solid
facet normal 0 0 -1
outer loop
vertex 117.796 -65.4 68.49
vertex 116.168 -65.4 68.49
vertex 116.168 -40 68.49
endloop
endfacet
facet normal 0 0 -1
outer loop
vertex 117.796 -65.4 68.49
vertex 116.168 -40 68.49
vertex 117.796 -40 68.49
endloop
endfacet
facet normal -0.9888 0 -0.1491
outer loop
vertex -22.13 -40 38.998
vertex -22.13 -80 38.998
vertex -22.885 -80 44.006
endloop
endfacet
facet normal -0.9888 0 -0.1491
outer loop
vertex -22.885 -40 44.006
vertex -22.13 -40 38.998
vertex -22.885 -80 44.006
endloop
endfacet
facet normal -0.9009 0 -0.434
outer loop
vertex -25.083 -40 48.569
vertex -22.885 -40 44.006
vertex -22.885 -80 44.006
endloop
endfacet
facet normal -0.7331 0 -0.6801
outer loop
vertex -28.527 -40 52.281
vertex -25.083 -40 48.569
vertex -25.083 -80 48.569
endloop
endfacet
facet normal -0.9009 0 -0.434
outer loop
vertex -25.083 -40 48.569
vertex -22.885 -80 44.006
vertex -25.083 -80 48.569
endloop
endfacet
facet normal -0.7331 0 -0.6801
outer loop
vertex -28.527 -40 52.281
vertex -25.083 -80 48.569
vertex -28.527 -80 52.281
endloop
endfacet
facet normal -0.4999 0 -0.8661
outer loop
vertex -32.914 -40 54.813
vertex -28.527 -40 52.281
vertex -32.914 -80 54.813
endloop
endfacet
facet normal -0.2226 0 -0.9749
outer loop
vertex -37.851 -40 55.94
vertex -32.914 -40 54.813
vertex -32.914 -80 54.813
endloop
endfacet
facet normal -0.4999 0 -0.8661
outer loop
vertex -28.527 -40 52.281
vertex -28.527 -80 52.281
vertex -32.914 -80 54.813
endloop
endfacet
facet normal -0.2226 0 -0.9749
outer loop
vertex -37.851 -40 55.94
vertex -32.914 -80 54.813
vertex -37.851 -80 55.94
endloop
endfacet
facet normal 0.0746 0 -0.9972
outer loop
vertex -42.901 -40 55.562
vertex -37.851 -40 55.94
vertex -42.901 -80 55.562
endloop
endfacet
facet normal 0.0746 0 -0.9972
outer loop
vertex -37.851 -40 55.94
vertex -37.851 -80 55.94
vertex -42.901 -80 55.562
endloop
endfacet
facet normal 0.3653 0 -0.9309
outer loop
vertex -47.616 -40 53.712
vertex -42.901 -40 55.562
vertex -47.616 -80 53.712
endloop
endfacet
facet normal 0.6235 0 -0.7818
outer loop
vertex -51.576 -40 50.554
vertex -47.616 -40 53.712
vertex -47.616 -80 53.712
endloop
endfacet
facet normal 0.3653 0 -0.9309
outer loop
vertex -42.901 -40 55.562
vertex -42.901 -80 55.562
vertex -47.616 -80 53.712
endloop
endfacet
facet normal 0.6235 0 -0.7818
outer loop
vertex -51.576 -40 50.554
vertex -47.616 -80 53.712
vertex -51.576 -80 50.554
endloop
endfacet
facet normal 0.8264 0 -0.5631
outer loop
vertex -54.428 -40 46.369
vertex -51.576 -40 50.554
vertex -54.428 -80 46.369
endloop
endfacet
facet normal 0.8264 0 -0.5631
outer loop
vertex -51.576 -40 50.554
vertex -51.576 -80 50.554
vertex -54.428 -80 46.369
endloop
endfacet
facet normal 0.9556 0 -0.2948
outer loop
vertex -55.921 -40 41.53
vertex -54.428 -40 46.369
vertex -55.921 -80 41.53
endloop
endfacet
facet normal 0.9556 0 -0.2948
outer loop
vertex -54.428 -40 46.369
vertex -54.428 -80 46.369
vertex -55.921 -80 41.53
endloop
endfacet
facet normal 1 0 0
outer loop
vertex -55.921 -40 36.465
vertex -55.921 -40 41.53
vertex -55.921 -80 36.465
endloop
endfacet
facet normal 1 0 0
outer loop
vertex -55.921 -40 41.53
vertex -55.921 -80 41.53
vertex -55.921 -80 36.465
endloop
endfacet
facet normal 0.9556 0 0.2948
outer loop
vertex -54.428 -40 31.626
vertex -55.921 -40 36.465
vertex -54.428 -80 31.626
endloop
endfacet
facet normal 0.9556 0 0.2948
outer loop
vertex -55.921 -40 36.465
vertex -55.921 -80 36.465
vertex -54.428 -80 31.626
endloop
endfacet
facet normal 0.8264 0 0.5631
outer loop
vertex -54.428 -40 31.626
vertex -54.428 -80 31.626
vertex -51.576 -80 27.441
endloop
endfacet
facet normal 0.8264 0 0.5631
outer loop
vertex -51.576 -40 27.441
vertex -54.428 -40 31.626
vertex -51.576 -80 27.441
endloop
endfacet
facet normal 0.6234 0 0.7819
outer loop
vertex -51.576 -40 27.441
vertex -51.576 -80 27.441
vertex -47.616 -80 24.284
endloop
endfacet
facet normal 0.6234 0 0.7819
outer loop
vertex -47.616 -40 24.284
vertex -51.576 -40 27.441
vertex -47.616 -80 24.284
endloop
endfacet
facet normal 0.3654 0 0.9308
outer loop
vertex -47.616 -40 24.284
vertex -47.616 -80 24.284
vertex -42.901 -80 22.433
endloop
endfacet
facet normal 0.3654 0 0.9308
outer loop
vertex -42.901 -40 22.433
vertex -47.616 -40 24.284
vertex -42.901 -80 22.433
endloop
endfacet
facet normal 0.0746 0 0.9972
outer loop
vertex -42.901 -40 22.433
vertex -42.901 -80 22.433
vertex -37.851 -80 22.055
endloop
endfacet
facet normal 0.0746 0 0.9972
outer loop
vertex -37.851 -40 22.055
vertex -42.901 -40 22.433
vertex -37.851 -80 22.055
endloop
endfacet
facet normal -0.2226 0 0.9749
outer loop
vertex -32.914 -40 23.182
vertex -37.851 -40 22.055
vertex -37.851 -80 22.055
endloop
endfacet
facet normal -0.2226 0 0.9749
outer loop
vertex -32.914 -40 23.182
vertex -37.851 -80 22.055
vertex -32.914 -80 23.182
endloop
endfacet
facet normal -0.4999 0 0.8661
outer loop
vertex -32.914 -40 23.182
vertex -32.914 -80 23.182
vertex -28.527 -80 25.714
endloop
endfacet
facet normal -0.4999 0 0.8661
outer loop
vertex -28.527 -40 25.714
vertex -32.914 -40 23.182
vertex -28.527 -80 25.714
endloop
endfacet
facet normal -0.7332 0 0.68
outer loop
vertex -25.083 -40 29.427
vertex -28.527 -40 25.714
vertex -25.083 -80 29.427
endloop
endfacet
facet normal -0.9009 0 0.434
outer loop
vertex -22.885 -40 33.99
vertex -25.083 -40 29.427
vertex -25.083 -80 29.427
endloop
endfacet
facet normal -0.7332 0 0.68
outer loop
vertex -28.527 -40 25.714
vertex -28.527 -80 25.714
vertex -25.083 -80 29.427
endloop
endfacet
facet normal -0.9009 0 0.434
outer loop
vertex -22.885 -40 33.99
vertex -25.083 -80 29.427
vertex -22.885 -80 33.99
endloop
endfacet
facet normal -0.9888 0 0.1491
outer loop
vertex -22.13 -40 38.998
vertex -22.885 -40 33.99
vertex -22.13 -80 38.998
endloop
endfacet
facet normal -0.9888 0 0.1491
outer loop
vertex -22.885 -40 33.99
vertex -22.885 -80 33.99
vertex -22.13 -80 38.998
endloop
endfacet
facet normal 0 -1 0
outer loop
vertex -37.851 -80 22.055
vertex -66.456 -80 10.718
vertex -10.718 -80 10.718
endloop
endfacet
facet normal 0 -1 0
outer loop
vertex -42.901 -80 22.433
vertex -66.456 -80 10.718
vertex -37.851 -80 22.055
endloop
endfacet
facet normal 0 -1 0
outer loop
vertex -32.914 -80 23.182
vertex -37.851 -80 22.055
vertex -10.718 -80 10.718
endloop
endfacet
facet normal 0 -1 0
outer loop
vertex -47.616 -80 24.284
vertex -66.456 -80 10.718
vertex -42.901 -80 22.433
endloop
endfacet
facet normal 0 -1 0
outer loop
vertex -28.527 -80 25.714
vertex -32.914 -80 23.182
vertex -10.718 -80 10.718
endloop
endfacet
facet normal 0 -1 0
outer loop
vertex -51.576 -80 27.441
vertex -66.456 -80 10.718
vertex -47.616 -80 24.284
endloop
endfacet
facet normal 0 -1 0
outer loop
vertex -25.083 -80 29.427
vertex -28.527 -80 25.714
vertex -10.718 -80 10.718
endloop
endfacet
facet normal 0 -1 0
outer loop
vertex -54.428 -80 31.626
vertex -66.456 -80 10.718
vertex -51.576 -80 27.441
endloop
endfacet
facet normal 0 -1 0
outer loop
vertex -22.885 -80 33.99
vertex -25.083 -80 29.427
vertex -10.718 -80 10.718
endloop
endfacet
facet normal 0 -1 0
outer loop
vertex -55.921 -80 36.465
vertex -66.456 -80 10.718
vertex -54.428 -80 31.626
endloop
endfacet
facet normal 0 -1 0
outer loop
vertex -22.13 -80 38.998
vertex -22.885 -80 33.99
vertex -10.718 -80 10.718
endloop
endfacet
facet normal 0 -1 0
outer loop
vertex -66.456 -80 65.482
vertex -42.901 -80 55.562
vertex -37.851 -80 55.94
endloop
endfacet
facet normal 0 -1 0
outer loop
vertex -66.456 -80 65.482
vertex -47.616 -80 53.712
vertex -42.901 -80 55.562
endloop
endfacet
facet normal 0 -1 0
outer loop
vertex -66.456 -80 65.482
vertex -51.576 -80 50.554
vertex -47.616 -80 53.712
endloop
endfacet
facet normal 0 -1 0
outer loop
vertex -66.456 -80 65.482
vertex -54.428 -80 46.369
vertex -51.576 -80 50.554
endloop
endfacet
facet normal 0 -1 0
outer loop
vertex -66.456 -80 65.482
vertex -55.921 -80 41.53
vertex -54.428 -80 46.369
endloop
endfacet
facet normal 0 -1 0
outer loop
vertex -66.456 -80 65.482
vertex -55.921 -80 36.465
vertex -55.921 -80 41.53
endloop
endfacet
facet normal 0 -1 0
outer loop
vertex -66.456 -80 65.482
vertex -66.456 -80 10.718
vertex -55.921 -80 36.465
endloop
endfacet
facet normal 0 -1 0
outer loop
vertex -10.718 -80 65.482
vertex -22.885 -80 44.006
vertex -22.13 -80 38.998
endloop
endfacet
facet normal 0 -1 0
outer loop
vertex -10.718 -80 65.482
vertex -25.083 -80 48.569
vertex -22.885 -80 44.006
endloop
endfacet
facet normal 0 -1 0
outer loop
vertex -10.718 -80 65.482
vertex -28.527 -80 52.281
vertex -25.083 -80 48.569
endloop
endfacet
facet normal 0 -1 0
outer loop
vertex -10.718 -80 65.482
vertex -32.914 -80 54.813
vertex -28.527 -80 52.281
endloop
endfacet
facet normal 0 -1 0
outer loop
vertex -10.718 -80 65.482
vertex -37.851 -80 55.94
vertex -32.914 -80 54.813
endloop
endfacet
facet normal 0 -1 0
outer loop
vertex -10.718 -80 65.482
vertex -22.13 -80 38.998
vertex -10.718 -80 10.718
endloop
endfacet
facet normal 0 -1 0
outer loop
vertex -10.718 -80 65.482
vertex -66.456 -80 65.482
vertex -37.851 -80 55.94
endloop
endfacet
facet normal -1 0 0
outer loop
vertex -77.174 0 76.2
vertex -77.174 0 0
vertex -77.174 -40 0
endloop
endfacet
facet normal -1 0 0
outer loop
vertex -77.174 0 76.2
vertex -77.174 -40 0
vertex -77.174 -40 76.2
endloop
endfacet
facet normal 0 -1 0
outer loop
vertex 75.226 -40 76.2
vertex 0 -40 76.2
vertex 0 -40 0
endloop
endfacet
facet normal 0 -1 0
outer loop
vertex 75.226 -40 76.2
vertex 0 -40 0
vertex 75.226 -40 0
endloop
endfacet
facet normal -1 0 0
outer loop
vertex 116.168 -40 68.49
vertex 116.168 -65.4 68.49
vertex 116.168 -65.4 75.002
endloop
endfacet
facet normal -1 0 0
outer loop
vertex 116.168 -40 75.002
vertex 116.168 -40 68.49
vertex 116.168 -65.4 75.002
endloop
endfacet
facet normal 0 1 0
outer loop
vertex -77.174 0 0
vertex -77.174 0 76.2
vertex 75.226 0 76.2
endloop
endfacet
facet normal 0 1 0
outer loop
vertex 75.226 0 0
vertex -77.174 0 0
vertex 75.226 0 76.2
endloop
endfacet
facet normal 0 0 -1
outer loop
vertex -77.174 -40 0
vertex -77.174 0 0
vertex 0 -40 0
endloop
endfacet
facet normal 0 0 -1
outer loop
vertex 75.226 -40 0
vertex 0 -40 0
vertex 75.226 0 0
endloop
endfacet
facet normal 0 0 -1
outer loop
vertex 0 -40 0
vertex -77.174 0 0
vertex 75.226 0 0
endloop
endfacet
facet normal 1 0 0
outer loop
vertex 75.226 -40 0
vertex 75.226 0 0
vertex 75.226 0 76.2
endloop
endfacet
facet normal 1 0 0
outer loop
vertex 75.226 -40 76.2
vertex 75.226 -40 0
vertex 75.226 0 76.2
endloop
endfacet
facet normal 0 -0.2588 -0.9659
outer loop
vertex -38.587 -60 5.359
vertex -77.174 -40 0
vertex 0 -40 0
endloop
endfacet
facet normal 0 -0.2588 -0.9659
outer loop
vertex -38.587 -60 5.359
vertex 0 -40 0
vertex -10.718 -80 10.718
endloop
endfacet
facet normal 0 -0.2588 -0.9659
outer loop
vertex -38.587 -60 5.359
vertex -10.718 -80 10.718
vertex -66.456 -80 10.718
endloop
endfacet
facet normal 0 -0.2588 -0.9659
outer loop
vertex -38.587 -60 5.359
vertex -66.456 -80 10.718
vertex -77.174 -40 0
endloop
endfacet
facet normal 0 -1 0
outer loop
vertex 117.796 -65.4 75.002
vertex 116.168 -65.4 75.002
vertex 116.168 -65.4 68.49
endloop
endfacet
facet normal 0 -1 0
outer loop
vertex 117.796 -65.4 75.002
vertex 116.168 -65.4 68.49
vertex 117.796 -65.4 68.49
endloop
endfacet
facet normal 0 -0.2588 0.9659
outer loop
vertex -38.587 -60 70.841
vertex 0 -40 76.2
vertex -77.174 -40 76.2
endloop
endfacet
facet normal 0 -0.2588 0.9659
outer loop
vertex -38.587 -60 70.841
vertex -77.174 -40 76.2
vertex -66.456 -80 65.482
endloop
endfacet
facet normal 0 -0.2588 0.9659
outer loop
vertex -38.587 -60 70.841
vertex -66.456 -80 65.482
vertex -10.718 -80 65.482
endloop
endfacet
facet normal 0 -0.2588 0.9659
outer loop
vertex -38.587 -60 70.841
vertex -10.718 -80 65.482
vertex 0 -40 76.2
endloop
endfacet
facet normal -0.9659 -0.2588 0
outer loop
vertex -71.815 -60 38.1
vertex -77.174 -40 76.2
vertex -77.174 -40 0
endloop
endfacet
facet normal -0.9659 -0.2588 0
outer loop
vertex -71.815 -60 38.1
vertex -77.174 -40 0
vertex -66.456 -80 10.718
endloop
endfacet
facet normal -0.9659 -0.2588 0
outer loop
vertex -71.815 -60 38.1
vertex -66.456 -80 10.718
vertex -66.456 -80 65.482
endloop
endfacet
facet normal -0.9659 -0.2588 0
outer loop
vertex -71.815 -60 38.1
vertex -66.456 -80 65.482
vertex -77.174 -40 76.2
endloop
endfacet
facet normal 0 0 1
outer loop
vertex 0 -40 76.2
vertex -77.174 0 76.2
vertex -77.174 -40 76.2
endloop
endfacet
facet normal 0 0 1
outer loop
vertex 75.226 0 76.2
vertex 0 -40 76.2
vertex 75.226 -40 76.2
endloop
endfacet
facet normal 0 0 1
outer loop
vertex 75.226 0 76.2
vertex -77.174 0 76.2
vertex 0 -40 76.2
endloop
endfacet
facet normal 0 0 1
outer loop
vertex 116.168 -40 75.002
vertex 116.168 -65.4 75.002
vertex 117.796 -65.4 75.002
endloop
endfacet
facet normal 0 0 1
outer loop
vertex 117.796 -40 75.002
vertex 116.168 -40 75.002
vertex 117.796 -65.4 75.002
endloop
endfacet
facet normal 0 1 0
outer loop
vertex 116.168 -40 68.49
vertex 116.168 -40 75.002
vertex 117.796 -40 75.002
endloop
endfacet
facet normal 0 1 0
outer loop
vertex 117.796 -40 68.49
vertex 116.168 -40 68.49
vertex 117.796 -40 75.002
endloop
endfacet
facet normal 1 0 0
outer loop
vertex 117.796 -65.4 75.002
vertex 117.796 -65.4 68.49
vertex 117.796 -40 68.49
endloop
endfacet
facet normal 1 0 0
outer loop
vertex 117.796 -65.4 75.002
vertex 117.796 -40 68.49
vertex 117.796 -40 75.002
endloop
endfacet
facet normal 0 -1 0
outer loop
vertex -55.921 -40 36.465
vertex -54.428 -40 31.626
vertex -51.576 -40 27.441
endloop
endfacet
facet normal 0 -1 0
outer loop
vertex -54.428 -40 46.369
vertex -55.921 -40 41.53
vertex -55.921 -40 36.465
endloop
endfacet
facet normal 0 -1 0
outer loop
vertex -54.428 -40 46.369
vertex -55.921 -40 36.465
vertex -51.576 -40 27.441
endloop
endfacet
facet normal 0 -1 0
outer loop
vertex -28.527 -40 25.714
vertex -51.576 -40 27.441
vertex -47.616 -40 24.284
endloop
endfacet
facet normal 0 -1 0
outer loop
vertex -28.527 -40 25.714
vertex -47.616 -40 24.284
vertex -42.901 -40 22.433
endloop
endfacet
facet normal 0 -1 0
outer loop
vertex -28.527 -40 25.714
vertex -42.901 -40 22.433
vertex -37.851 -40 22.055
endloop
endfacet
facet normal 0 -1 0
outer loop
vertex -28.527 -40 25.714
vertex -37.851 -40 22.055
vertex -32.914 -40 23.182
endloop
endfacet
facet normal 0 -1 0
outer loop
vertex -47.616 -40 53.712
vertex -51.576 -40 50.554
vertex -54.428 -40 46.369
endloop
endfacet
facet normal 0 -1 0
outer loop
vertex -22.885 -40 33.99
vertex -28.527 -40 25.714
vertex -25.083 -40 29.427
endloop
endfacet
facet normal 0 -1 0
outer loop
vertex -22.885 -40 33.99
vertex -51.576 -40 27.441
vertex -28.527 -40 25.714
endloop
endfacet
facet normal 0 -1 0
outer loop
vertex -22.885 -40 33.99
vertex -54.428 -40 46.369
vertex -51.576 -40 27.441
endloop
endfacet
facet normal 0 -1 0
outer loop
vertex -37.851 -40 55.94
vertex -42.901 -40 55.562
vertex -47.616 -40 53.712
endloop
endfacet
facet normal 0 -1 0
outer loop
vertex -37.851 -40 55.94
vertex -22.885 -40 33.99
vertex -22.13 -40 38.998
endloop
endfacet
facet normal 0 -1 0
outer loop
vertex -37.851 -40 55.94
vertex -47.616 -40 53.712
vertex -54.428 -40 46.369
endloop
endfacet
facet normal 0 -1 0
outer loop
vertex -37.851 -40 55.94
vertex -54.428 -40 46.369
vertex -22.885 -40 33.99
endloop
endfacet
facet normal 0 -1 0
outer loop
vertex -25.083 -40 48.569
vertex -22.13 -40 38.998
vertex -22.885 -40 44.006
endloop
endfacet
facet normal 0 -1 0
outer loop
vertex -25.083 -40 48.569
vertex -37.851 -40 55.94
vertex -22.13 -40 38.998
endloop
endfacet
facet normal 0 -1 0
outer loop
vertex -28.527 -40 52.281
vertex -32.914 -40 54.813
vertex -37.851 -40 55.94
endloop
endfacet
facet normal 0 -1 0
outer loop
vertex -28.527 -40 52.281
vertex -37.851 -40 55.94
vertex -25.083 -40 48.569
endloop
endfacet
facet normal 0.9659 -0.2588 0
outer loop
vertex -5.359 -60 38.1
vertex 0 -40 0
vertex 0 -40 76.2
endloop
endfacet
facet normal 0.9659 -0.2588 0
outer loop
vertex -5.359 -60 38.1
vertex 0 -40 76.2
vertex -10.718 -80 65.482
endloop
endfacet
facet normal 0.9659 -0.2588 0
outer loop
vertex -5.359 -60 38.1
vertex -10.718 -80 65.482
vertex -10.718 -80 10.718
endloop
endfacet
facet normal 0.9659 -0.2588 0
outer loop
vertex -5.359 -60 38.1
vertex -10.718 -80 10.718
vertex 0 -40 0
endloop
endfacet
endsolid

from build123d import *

# Parameters (mm, degrees)
F0_W     = 152.4
F0_H     = 76.2
F1_DEPTH = 40
F2_W     = 1.6280785203
F2_H     = 6.5123066306
F3_DEPTH = 25.4
F4_W     = 77.1738027223
F4_H     = 76.2
F5_DEPTH = 40
F5_TAPER = 15
F6_R     = 16.9902904257
F7_DEPTH = 40


with BuildPart() as f1:
    # F0 (on Front) → F1 (new body)
    with BuildSketch(Plane.XZ):
        with Locations((-0.9738027223, 38.1)):
            Rectangle(F0_W, F0_H)
    extrude(amount=F1_DEPTH)

    # F4 (on face) → F5 (join)
    with BuildSketch(Plane.XZ.offset(40)):
        with Locations((-38.5869013612, 38.1)):
            Rectangle(F4_W, F4_H)
    extrude(amount=F5_DEPTH, taper=F5_TAPER)

    # F6 (on face) → F7 (cut)
    with BuildSketch(Plane.XZ.offset(80)):
        with Locations((-39.1207635403, 38.9976799488)):
            Circle(F6_R)
    extrude(amount=-F7_DEPTH, mode=Mode.SUBTRACT)


with BuildPart() as f3:
    # F2 (on face) → F3 (new body)
    with BuildSketch(Plane.XZ.offset(40)):
        with Locations((116.9820092618, 71.7460699379)):
            Rectangle(F2_W, F2_H)
    extrude(amount=F3_DEPTH)


solid = Compound([f1.part, f3.part])
